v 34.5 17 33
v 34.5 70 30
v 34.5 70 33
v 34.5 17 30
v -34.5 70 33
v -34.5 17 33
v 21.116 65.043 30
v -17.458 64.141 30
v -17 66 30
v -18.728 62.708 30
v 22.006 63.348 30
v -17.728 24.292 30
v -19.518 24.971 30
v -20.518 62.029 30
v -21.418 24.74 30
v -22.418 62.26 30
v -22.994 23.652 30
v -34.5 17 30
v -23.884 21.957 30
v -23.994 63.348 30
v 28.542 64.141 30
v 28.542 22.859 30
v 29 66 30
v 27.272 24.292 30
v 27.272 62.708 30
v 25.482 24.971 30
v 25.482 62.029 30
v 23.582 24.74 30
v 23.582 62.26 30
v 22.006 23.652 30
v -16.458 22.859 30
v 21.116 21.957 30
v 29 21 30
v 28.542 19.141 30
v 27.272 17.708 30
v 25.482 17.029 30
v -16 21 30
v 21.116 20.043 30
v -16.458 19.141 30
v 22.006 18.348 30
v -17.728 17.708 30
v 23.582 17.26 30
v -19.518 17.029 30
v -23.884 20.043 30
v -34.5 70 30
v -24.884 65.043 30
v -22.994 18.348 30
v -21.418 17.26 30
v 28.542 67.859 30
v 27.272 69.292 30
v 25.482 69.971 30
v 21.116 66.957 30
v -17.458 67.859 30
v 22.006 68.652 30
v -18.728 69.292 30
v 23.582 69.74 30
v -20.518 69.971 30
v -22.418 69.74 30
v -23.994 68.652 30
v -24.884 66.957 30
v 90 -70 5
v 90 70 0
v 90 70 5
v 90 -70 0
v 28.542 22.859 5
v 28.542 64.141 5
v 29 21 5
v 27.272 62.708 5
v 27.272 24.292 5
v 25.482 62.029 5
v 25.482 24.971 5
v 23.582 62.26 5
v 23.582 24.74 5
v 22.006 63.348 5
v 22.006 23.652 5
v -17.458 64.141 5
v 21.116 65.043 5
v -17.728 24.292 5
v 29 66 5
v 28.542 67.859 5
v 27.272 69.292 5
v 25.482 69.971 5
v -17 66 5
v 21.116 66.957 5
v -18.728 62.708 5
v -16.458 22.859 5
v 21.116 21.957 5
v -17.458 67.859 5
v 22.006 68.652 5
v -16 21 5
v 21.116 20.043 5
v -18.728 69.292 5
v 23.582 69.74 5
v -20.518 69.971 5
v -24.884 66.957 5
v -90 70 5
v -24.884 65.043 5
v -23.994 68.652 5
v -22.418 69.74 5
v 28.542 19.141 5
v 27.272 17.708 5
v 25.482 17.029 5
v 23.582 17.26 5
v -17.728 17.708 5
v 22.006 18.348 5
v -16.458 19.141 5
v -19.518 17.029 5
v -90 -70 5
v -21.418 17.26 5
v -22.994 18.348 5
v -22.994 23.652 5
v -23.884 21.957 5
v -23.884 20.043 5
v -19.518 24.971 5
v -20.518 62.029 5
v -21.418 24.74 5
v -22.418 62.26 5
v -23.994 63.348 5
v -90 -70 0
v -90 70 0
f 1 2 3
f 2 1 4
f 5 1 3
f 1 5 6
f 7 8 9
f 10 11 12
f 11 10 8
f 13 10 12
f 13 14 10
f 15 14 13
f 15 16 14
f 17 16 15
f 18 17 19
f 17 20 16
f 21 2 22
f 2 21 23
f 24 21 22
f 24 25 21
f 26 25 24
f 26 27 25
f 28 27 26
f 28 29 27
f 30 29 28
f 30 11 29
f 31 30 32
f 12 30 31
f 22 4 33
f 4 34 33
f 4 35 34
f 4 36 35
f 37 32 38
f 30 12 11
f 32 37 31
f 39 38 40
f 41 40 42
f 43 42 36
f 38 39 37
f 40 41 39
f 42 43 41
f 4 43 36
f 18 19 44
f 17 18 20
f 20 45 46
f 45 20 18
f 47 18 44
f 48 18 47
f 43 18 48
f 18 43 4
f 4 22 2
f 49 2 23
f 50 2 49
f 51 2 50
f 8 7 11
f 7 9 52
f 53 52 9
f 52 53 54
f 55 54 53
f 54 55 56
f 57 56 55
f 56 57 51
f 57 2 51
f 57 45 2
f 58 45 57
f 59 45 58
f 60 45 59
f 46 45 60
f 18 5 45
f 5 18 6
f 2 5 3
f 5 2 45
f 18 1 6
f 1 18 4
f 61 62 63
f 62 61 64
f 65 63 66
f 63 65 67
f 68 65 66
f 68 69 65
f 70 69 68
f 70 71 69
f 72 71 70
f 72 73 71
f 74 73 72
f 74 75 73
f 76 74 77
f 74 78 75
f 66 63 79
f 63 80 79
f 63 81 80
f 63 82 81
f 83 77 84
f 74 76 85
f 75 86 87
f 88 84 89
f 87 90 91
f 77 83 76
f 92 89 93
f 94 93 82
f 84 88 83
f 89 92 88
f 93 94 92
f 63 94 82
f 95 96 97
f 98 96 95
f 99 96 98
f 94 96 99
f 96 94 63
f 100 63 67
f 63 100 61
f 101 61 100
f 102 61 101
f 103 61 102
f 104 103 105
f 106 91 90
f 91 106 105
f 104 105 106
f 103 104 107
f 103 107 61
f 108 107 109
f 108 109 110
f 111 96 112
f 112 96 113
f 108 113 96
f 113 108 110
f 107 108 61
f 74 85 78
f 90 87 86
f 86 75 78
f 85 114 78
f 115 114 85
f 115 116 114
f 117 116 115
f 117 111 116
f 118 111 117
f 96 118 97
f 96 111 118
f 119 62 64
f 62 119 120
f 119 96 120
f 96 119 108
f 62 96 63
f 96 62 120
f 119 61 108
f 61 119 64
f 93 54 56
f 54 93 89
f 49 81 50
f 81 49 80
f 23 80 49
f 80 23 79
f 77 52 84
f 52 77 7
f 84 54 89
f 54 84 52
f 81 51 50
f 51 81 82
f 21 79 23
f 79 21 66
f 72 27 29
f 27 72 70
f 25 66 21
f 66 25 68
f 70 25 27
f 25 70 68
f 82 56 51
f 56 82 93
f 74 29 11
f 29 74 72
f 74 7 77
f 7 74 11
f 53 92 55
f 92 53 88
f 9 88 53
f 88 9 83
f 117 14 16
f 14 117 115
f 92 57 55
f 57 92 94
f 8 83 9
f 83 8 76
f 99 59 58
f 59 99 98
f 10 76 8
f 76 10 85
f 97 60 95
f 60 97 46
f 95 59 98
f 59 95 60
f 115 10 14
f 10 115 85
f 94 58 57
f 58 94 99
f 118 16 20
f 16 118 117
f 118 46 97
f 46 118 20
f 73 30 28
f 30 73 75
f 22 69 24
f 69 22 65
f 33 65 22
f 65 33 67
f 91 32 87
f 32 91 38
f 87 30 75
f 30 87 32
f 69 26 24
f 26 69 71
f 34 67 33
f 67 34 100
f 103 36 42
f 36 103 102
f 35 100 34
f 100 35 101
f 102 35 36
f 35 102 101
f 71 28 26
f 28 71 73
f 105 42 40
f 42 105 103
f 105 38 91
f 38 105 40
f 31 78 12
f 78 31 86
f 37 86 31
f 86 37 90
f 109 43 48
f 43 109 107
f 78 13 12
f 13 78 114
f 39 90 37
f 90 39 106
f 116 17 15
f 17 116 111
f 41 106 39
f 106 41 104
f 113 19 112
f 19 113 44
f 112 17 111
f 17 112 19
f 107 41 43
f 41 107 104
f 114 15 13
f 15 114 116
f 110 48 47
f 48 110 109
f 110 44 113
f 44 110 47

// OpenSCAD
x_max = 180;
y_max = 140;
x_ardu = 69;
y_ardu = 53;
h_ardu = 3;
h_max = 5;
r_sup = 4;
module Arduino(){
    cube([x_ardu,y_ardu,h_ardu]);
    }
module biggest(){
    cube([x_max,y_max,h_max]);
    }

module connection(){
    cylinder(30,r_sup,r_sup,r_sup);
    }
    
translate([-x_ardu/2,y_max/2 -y_ardu,30])
    Arduino();
translate([-x_max/2,-y_max/2])
    biggest();
translate([x_max/2 - x_ardu + r_sup,y_max/2- r_sup,0])
    connection();
translate([-x_max/2 + x_ardu,y_max/2-r_sup,0 ])
    connection();
translate([x_max/2 - x_ardu+r_sup,y_max/2-y_ardu+r_sup,0])
    connection();
translate([x_max/4 - x_ardu+r_sup,y_max/2-y_ardu+r_sup,0])
    connection();
